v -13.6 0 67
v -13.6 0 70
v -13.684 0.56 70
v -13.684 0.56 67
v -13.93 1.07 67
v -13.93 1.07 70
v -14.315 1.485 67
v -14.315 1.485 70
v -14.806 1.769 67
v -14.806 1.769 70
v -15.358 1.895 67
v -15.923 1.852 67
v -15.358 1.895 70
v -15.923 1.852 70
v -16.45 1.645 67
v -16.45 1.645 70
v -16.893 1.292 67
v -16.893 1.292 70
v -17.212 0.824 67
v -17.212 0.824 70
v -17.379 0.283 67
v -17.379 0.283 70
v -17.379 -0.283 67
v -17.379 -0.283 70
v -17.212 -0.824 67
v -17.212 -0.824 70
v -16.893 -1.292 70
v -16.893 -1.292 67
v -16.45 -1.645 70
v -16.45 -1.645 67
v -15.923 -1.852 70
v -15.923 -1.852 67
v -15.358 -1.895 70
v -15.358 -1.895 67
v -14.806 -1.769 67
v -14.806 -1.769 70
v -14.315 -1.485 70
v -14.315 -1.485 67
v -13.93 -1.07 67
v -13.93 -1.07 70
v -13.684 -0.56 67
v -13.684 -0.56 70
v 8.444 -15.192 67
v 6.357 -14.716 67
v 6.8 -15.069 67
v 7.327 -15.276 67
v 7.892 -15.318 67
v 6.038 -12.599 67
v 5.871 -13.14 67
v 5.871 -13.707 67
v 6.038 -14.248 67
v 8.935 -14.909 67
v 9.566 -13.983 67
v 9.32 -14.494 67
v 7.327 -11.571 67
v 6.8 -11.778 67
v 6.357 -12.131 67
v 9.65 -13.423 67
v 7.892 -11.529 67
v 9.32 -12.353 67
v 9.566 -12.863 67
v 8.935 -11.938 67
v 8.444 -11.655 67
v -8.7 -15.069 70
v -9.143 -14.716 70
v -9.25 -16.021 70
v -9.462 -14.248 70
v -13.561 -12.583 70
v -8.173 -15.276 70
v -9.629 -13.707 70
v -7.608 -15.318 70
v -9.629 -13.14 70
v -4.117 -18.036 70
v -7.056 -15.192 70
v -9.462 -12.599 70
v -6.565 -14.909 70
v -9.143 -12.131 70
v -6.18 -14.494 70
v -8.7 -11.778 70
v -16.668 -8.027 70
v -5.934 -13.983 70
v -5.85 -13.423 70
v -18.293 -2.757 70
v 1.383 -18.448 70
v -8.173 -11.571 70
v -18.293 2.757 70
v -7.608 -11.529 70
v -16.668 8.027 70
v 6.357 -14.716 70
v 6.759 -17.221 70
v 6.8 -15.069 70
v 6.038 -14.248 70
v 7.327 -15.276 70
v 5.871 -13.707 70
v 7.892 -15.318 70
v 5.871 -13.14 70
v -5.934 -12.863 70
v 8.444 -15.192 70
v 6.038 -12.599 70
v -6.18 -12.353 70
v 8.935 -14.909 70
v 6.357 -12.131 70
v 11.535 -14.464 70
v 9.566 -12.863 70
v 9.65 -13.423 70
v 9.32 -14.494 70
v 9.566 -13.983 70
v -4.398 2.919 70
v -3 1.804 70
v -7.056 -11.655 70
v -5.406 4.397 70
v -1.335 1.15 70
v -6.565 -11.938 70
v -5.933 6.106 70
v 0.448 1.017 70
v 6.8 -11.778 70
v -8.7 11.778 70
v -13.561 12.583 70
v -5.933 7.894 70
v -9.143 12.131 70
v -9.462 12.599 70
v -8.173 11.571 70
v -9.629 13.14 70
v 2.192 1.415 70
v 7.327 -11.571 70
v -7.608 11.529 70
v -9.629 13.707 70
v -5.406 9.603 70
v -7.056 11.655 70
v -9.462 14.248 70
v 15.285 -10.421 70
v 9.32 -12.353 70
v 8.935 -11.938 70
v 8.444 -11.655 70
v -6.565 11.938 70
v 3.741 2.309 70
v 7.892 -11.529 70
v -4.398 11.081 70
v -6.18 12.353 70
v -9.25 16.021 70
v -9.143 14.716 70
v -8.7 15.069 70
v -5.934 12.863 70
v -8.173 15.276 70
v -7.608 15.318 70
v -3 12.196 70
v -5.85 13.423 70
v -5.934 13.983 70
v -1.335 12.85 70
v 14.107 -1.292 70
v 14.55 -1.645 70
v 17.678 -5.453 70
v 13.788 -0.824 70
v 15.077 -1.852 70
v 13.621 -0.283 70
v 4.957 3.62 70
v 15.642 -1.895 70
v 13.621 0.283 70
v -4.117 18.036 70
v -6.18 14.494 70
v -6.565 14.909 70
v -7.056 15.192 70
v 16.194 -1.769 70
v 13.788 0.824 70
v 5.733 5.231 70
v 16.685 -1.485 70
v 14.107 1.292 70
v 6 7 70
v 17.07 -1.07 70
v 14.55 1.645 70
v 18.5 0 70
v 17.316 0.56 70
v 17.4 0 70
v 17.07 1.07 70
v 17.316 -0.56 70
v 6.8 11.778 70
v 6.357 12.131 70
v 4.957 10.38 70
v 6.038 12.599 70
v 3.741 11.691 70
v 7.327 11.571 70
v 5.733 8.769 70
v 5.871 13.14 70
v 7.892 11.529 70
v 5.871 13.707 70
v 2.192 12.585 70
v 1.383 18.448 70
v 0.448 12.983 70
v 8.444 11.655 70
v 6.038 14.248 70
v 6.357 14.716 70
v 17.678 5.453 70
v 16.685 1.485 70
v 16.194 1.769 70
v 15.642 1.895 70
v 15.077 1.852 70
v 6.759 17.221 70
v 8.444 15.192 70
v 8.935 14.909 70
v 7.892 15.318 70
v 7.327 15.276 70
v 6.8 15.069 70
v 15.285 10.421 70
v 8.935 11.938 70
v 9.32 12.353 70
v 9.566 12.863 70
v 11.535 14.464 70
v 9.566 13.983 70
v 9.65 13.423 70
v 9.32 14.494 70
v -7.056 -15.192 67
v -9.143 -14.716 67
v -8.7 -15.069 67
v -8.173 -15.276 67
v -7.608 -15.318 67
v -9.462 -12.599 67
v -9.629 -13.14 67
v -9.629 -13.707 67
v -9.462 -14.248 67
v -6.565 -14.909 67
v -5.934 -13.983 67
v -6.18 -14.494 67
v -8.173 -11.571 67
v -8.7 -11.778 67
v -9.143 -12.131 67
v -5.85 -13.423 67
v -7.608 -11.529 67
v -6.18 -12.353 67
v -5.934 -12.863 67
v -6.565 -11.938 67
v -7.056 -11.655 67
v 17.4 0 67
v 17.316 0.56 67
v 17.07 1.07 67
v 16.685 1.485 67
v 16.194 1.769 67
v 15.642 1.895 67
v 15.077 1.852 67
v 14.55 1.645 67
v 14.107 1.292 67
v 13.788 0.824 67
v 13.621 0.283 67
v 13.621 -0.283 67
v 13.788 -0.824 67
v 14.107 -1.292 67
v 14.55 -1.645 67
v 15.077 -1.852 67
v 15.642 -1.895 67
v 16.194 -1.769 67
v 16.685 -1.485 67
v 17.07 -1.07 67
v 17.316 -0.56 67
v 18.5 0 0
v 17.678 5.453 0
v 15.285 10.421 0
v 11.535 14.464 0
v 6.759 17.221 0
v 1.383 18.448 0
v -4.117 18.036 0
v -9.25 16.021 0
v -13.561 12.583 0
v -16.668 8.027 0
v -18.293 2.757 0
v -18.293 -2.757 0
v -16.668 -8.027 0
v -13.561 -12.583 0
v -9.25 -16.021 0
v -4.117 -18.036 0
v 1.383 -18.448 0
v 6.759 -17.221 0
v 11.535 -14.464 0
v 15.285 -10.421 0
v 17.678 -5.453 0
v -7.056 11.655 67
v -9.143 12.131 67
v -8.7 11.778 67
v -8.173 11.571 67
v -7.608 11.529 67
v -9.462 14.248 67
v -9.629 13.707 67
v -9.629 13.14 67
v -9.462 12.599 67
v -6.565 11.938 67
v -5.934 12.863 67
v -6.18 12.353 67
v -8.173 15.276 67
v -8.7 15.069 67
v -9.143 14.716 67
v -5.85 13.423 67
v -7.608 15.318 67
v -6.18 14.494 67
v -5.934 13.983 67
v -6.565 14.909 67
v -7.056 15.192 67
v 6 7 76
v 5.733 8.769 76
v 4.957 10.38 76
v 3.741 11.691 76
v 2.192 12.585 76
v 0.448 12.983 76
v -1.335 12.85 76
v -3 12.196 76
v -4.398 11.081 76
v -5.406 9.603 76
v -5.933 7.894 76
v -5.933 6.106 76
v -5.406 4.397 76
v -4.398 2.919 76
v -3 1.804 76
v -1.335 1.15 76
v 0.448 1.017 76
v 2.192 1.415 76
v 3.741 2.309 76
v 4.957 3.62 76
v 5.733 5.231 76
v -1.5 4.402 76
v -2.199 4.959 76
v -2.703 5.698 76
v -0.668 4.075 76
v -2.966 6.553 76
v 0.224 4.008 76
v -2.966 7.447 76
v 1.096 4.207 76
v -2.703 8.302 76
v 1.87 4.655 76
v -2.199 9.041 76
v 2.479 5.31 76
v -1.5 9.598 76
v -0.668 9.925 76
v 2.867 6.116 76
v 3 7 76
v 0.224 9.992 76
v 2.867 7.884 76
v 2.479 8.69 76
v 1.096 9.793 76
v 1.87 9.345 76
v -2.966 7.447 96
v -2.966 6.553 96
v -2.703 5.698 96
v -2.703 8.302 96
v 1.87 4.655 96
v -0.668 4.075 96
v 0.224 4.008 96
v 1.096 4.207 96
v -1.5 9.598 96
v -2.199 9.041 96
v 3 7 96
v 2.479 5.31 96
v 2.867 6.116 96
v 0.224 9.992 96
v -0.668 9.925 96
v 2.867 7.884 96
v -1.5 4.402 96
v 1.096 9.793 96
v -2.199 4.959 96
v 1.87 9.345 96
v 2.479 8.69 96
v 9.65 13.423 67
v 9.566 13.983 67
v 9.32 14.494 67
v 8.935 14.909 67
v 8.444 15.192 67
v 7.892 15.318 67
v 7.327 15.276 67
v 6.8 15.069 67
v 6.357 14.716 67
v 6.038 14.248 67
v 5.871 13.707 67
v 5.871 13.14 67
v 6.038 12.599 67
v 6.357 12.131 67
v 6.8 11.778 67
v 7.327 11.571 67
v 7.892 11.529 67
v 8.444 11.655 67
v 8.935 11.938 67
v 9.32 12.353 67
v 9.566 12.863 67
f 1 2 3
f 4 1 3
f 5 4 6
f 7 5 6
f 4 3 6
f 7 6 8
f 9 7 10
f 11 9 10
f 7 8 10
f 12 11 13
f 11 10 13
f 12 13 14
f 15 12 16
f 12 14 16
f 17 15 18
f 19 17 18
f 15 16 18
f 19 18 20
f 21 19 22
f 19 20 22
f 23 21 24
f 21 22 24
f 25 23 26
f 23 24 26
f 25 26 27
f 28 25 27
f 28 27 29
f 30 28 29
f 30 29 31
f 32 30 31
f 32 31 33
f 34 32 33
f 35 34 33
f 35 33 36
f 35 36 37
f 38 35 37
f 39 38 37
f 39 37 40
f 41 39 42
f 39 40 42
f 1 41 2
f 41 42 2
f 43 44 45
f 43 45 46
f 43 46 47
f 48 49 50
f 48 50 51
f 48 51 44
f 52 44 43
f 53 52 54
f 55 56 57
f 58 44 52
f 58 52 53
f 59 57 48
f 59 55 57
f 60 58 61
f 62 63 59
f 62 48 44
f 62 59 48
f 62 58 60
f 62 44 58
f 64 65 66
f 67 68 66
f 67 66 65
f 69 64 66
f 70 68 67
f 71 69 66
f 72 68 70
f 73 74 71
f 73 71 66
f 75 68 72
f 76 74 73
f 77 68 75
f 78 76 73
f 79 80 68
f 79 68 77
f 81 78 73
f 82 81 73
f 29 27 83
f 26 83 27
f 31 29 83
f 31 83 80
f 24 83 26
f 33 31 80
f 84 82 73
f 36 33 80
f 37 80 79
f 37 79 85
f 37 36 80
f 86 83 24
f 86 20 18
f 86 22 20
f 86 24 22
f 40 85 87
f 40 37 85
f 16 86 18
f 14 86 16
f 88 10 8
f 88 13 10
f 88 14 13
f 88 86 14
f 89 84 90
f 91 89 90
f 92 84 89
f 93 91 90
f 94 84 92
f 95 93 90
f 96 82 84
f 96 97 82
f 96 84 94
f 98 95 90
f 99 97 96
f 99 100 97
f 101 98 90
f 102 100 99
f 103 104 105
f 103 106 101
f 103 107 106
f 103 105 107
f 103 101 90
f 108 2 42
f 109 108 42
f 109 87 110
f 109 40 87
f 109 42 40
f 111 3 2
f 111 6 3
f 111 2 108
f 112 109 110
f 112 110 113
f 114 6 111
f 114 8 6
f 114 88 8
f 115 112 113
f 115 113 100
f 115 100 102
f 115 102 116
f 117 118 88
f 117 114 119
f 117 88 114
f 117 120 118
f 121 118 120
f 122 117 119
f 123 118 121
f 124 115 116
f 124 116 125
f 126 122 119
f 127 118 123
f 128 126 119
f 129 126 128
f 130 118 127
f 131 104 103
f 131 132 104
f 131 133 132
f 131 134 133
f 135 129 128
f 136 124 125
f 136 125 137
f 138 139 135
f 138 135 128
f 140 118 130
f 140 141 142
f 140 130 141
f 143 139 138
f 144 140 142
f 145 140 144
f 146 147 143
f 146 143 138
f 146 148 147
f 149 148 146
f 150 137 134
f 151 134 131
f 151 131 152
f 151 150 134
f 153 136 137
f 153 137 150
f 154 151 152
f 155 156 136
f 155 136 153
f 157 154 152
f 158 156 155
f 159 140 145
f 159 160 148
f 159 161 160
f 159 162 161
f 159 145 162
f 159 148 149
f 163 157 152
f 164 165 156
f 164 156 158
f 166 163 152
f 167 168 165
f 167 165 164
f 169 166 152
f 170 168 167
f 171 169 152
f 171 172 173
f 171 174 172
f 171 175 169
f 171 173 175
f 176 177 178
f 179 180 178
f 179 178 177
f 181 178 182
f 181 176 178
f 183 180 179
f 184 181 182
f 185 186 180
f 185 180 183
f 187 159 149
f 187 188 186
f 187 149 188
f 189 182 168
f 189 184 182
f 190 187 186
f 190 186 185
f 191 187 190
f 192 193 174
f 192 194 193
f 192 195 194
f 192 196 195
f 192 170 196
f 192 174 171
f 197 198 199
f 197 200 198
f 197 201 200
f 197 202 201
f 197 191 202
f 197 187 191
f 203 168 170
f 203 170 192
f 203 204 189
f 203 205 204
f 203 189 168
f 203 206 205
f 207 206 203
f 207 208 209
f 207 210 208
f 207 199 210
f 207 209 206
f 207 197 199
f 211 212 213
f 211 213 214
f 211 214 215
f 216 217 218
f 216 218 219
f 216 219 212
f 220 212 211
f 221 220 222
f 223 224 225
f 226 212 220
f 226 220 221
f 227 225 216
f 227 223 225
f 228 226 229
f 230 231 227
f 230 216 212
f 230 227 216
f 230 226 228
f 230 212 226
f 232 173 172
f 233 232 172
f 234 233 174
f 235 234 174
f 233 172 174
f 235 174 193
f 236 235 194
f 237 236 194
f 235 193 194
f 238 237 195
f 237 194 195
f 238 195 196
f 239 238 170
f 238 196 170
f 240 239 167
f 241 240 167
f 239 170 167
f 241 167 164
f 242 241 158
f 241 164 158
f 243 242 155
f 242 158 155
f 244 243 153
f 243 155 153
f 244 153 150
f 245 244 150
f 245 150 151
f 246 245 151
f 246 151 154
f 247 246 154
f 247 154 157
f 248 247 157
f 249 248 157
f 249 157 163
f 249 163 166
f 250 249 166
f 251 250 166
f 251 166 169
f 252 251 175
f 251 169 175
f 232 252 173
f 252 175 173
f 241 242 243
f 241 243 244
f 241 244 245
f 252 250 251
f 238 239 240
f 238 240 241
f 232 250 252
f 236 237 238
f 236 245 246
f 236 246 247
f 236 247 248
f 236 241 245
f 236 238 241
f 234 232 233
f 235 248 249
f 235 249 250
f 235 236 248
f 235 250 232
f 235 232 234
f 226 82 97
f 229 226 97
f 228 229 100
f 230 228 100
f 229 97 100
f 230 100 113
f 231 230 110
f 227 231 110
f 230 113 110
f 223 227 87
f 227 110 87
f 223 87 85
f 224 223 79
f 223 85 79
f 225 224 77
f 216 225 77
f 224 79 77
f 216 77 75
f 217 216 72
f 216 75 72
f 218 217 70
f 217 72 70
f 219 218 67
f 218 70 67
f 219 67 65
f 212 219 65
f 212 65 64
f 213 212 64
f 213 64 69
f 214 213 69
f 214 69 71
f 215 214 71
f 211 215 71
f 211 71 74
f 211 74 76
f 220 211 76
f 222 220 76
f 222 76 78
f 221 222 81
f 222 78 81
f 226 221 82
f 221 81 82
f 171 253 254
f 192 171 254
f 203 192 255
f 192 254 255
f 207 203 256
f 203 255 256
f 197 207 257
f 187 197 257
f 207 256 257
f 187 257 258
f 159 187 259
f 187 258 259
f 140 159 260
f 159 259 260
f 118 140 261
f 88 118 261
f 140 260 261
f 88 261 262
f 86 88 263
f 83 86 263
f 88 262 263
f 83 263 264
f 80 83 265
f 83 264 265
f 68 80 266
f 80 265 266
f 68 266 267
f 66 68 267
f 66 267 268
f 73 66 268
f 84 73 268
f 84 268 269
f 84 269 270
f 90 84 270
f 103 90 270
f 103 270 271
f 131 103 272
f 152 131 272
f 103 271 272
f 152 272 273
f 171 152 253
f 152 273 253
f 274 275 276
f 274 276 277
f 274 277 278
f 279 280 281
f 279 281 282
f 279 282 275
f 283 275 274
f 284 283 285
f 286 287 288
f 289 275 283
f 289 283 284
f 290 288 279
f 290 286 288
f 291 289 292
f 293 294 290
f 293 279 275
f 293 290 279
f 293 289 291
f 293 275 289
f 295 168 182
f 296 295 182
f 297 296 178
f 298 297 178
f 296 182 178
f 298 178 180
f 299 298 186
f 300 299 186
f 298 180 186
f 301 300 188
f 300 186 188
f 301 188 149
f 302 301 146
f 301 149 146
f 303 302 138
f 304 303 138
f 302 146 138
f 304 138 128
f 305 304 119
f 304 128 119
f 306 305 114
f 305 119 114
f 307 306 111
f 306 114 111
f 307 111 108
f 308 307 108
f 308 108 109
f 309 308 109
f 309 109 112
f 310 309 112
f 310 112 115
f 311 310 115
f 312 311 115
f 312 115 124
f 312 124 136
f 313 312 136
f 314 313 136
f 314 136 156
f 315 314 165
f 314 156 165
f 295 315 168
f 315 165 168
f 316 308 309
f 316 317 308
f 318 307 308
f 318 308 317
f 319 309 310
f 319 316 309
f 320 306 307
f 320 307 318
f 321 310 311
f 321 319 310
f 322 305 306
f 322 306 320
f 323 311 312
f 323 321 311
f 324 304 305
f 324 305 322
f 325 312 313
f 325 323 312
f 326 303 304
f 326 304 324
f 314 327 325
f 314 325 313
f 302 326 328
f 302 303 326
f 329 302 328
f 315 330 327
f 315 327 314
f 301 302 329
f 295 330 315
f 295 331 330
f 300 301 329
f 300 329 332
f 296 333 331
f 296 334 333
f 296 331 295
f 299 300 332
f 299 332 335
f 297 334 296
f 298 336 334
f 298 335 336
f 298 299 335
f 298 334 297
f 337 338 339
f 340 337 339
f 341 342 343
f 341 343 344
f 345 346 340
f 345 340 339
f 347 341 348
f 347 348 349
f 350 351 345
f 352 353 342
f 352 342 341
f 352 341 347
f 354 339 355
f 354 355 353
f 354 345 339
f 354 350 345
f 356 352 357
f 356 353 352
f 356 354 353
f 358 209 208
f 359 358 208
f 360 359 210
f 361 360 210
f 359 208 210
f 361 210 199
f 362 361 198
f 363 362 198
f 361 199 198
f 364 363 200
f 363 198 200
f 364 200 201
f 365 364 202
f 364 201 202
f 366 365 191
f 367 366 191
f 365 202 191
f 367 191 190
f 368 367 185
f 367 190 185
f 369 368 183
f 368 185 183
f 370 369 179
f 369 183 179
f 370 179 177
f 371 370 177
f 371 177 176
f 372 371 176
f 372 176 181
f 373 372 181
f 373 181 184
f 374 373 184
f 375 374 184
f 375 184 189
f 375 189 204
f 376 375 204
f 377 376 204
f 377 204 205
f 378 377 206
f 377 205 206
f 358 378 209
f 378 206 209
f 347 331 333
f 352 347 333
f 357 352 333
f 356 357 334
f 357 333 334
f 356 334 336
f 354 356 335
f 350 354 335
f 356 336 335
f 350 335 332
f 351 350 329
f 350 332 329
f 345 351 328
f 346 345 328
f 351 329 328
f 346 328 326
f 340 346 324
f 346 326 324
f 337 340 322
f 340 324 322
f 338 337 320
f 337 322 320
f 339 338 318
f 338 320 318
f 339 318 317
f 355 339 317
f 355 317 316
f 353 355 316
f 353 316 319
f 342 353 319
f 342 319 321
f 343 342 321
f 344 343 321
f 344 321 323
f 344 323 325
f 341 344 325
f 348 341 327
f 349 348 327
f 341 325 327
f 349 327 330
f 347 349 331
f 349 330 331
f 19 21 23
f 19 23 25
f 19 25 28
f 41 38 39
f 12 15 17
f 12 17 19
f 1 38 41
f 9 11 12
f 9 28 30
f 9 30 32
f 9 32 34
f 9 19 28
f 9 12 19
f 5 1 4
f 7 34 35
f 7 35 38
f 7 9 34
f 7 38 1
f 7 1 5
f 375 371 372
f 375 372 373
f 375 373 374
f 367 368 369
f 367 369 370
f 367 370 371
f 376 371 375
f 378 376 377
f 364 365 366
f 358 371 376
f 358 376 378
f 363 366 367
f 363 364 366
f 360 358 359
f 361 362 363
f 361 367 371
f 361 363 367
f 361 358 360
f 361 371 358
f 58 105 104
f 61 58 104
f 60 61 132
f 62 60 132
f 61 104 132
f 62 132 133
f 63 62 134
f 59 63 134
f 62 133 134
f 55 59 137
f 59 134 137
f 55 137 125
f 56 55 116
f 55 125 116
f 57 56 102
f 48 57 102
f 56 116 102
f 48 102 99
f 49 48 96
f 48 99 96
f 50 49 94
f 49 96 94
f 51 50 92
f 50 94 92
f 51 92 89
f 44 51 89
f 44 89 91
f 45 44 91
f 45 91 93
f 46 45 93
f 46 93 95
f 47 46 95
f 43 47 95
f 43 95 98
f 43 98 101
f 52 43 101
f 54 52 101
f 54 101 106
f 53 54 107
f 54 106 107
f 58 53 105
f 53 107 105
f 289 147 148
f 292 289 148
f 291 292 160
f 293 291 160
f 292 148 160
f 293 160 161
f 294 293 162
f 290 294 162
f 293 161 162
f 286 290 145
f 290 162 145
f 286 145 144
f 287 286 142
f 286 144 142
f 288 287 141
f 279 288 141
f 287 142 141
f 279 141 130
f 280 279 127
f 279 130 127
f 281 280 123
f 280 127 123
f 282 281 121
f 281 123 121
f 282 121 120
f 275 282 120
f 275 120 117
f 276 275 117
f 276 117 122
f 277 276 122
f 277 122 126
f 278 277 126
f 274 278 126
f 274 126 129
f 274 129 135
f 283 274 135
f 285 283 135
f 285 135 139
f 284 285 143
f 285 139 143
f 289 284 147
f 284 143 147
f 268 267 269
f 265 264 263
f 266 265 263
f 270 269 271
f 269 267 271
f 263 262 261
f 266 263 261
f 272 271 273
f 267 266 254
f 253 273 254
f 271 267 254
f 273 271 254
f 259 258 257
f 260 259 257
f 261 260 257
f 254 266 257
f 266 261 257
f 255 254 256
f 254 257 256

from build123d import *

# Parameters (mm, degrees)
SKETCH1_R           = 18.5
BOSS_EXTRUDE1_DEPTH = 70
SKETCH2_R           = 1.9
CUT_EXTRUDE1_DEPTH  = 3
SKETCH2_3_R         = 6
BOSS_EXTRUDE2_DEPTH = 6
SKETCH3_R           = 3
BOSS_EXTRUDE3_DEPTH = 20


with BuildPart() as part:
    # Sketch1 → Boss-Extrude1 (new body)
    with BuildSketch(Plane(origin=(0, 0, 0), x_dir=(0, 1, 0), z_dir=(0, 0, 1))):
        Circle(SKETCH1_R)
    extrude(amount=BOSS_EXTRUDE1_DEPTH)

    # Sketch2 → Cut-Extrude1 (cut)
    with BuildSketch(Plane(origin=(0, 0, 70), x_dir=(-1, 0, 0), z_dir=(0, 0, 1))):
        with Locations((-15.5, 0)):
            Circle(SKETCH2_R)
        with Locations((-7.75, 13.423393759)):
            Circle(SKETCH2_R)
        with Locations((7.75, 13.423393759)):
            Circle(SKETCH2_R)
        with Locations((15.5, 0)):
            Circle(SKETCH2_R)
        with Locations((7.75, -13.423393759)):
            Circle(SKETCH2_R)
        with Locations((-7.75, -13.423393759)):
            Circle(SKETCH2_R)
    extrude(amount=-CUT_EXTRUDE1_DEPTH, mode=Mode.SUBTRACT)

    # Sketch2<3> → Boss-Extrude2 (add)
    with BuildSketch(Plane(origin=(0, 0, 70), x_dir=(-1, 0, 0), z_dir=(0, 0, 1))):
        with Locations((0, -7)):
            Circle(SKETCH2_3_R)
    extrude(amount=BOSS_EXTRUDE2_DEPTH)

    # Sketch3 → Boss-Extrude3 (add)
    with BuildSketch(Plane.XY.offset(76)):
        with Locations((0, 7)):
            Circle(SKETCH3_R)
    extrude(amount=BOSS_EXTRUDE3_DEPTH)


solid = part.part
